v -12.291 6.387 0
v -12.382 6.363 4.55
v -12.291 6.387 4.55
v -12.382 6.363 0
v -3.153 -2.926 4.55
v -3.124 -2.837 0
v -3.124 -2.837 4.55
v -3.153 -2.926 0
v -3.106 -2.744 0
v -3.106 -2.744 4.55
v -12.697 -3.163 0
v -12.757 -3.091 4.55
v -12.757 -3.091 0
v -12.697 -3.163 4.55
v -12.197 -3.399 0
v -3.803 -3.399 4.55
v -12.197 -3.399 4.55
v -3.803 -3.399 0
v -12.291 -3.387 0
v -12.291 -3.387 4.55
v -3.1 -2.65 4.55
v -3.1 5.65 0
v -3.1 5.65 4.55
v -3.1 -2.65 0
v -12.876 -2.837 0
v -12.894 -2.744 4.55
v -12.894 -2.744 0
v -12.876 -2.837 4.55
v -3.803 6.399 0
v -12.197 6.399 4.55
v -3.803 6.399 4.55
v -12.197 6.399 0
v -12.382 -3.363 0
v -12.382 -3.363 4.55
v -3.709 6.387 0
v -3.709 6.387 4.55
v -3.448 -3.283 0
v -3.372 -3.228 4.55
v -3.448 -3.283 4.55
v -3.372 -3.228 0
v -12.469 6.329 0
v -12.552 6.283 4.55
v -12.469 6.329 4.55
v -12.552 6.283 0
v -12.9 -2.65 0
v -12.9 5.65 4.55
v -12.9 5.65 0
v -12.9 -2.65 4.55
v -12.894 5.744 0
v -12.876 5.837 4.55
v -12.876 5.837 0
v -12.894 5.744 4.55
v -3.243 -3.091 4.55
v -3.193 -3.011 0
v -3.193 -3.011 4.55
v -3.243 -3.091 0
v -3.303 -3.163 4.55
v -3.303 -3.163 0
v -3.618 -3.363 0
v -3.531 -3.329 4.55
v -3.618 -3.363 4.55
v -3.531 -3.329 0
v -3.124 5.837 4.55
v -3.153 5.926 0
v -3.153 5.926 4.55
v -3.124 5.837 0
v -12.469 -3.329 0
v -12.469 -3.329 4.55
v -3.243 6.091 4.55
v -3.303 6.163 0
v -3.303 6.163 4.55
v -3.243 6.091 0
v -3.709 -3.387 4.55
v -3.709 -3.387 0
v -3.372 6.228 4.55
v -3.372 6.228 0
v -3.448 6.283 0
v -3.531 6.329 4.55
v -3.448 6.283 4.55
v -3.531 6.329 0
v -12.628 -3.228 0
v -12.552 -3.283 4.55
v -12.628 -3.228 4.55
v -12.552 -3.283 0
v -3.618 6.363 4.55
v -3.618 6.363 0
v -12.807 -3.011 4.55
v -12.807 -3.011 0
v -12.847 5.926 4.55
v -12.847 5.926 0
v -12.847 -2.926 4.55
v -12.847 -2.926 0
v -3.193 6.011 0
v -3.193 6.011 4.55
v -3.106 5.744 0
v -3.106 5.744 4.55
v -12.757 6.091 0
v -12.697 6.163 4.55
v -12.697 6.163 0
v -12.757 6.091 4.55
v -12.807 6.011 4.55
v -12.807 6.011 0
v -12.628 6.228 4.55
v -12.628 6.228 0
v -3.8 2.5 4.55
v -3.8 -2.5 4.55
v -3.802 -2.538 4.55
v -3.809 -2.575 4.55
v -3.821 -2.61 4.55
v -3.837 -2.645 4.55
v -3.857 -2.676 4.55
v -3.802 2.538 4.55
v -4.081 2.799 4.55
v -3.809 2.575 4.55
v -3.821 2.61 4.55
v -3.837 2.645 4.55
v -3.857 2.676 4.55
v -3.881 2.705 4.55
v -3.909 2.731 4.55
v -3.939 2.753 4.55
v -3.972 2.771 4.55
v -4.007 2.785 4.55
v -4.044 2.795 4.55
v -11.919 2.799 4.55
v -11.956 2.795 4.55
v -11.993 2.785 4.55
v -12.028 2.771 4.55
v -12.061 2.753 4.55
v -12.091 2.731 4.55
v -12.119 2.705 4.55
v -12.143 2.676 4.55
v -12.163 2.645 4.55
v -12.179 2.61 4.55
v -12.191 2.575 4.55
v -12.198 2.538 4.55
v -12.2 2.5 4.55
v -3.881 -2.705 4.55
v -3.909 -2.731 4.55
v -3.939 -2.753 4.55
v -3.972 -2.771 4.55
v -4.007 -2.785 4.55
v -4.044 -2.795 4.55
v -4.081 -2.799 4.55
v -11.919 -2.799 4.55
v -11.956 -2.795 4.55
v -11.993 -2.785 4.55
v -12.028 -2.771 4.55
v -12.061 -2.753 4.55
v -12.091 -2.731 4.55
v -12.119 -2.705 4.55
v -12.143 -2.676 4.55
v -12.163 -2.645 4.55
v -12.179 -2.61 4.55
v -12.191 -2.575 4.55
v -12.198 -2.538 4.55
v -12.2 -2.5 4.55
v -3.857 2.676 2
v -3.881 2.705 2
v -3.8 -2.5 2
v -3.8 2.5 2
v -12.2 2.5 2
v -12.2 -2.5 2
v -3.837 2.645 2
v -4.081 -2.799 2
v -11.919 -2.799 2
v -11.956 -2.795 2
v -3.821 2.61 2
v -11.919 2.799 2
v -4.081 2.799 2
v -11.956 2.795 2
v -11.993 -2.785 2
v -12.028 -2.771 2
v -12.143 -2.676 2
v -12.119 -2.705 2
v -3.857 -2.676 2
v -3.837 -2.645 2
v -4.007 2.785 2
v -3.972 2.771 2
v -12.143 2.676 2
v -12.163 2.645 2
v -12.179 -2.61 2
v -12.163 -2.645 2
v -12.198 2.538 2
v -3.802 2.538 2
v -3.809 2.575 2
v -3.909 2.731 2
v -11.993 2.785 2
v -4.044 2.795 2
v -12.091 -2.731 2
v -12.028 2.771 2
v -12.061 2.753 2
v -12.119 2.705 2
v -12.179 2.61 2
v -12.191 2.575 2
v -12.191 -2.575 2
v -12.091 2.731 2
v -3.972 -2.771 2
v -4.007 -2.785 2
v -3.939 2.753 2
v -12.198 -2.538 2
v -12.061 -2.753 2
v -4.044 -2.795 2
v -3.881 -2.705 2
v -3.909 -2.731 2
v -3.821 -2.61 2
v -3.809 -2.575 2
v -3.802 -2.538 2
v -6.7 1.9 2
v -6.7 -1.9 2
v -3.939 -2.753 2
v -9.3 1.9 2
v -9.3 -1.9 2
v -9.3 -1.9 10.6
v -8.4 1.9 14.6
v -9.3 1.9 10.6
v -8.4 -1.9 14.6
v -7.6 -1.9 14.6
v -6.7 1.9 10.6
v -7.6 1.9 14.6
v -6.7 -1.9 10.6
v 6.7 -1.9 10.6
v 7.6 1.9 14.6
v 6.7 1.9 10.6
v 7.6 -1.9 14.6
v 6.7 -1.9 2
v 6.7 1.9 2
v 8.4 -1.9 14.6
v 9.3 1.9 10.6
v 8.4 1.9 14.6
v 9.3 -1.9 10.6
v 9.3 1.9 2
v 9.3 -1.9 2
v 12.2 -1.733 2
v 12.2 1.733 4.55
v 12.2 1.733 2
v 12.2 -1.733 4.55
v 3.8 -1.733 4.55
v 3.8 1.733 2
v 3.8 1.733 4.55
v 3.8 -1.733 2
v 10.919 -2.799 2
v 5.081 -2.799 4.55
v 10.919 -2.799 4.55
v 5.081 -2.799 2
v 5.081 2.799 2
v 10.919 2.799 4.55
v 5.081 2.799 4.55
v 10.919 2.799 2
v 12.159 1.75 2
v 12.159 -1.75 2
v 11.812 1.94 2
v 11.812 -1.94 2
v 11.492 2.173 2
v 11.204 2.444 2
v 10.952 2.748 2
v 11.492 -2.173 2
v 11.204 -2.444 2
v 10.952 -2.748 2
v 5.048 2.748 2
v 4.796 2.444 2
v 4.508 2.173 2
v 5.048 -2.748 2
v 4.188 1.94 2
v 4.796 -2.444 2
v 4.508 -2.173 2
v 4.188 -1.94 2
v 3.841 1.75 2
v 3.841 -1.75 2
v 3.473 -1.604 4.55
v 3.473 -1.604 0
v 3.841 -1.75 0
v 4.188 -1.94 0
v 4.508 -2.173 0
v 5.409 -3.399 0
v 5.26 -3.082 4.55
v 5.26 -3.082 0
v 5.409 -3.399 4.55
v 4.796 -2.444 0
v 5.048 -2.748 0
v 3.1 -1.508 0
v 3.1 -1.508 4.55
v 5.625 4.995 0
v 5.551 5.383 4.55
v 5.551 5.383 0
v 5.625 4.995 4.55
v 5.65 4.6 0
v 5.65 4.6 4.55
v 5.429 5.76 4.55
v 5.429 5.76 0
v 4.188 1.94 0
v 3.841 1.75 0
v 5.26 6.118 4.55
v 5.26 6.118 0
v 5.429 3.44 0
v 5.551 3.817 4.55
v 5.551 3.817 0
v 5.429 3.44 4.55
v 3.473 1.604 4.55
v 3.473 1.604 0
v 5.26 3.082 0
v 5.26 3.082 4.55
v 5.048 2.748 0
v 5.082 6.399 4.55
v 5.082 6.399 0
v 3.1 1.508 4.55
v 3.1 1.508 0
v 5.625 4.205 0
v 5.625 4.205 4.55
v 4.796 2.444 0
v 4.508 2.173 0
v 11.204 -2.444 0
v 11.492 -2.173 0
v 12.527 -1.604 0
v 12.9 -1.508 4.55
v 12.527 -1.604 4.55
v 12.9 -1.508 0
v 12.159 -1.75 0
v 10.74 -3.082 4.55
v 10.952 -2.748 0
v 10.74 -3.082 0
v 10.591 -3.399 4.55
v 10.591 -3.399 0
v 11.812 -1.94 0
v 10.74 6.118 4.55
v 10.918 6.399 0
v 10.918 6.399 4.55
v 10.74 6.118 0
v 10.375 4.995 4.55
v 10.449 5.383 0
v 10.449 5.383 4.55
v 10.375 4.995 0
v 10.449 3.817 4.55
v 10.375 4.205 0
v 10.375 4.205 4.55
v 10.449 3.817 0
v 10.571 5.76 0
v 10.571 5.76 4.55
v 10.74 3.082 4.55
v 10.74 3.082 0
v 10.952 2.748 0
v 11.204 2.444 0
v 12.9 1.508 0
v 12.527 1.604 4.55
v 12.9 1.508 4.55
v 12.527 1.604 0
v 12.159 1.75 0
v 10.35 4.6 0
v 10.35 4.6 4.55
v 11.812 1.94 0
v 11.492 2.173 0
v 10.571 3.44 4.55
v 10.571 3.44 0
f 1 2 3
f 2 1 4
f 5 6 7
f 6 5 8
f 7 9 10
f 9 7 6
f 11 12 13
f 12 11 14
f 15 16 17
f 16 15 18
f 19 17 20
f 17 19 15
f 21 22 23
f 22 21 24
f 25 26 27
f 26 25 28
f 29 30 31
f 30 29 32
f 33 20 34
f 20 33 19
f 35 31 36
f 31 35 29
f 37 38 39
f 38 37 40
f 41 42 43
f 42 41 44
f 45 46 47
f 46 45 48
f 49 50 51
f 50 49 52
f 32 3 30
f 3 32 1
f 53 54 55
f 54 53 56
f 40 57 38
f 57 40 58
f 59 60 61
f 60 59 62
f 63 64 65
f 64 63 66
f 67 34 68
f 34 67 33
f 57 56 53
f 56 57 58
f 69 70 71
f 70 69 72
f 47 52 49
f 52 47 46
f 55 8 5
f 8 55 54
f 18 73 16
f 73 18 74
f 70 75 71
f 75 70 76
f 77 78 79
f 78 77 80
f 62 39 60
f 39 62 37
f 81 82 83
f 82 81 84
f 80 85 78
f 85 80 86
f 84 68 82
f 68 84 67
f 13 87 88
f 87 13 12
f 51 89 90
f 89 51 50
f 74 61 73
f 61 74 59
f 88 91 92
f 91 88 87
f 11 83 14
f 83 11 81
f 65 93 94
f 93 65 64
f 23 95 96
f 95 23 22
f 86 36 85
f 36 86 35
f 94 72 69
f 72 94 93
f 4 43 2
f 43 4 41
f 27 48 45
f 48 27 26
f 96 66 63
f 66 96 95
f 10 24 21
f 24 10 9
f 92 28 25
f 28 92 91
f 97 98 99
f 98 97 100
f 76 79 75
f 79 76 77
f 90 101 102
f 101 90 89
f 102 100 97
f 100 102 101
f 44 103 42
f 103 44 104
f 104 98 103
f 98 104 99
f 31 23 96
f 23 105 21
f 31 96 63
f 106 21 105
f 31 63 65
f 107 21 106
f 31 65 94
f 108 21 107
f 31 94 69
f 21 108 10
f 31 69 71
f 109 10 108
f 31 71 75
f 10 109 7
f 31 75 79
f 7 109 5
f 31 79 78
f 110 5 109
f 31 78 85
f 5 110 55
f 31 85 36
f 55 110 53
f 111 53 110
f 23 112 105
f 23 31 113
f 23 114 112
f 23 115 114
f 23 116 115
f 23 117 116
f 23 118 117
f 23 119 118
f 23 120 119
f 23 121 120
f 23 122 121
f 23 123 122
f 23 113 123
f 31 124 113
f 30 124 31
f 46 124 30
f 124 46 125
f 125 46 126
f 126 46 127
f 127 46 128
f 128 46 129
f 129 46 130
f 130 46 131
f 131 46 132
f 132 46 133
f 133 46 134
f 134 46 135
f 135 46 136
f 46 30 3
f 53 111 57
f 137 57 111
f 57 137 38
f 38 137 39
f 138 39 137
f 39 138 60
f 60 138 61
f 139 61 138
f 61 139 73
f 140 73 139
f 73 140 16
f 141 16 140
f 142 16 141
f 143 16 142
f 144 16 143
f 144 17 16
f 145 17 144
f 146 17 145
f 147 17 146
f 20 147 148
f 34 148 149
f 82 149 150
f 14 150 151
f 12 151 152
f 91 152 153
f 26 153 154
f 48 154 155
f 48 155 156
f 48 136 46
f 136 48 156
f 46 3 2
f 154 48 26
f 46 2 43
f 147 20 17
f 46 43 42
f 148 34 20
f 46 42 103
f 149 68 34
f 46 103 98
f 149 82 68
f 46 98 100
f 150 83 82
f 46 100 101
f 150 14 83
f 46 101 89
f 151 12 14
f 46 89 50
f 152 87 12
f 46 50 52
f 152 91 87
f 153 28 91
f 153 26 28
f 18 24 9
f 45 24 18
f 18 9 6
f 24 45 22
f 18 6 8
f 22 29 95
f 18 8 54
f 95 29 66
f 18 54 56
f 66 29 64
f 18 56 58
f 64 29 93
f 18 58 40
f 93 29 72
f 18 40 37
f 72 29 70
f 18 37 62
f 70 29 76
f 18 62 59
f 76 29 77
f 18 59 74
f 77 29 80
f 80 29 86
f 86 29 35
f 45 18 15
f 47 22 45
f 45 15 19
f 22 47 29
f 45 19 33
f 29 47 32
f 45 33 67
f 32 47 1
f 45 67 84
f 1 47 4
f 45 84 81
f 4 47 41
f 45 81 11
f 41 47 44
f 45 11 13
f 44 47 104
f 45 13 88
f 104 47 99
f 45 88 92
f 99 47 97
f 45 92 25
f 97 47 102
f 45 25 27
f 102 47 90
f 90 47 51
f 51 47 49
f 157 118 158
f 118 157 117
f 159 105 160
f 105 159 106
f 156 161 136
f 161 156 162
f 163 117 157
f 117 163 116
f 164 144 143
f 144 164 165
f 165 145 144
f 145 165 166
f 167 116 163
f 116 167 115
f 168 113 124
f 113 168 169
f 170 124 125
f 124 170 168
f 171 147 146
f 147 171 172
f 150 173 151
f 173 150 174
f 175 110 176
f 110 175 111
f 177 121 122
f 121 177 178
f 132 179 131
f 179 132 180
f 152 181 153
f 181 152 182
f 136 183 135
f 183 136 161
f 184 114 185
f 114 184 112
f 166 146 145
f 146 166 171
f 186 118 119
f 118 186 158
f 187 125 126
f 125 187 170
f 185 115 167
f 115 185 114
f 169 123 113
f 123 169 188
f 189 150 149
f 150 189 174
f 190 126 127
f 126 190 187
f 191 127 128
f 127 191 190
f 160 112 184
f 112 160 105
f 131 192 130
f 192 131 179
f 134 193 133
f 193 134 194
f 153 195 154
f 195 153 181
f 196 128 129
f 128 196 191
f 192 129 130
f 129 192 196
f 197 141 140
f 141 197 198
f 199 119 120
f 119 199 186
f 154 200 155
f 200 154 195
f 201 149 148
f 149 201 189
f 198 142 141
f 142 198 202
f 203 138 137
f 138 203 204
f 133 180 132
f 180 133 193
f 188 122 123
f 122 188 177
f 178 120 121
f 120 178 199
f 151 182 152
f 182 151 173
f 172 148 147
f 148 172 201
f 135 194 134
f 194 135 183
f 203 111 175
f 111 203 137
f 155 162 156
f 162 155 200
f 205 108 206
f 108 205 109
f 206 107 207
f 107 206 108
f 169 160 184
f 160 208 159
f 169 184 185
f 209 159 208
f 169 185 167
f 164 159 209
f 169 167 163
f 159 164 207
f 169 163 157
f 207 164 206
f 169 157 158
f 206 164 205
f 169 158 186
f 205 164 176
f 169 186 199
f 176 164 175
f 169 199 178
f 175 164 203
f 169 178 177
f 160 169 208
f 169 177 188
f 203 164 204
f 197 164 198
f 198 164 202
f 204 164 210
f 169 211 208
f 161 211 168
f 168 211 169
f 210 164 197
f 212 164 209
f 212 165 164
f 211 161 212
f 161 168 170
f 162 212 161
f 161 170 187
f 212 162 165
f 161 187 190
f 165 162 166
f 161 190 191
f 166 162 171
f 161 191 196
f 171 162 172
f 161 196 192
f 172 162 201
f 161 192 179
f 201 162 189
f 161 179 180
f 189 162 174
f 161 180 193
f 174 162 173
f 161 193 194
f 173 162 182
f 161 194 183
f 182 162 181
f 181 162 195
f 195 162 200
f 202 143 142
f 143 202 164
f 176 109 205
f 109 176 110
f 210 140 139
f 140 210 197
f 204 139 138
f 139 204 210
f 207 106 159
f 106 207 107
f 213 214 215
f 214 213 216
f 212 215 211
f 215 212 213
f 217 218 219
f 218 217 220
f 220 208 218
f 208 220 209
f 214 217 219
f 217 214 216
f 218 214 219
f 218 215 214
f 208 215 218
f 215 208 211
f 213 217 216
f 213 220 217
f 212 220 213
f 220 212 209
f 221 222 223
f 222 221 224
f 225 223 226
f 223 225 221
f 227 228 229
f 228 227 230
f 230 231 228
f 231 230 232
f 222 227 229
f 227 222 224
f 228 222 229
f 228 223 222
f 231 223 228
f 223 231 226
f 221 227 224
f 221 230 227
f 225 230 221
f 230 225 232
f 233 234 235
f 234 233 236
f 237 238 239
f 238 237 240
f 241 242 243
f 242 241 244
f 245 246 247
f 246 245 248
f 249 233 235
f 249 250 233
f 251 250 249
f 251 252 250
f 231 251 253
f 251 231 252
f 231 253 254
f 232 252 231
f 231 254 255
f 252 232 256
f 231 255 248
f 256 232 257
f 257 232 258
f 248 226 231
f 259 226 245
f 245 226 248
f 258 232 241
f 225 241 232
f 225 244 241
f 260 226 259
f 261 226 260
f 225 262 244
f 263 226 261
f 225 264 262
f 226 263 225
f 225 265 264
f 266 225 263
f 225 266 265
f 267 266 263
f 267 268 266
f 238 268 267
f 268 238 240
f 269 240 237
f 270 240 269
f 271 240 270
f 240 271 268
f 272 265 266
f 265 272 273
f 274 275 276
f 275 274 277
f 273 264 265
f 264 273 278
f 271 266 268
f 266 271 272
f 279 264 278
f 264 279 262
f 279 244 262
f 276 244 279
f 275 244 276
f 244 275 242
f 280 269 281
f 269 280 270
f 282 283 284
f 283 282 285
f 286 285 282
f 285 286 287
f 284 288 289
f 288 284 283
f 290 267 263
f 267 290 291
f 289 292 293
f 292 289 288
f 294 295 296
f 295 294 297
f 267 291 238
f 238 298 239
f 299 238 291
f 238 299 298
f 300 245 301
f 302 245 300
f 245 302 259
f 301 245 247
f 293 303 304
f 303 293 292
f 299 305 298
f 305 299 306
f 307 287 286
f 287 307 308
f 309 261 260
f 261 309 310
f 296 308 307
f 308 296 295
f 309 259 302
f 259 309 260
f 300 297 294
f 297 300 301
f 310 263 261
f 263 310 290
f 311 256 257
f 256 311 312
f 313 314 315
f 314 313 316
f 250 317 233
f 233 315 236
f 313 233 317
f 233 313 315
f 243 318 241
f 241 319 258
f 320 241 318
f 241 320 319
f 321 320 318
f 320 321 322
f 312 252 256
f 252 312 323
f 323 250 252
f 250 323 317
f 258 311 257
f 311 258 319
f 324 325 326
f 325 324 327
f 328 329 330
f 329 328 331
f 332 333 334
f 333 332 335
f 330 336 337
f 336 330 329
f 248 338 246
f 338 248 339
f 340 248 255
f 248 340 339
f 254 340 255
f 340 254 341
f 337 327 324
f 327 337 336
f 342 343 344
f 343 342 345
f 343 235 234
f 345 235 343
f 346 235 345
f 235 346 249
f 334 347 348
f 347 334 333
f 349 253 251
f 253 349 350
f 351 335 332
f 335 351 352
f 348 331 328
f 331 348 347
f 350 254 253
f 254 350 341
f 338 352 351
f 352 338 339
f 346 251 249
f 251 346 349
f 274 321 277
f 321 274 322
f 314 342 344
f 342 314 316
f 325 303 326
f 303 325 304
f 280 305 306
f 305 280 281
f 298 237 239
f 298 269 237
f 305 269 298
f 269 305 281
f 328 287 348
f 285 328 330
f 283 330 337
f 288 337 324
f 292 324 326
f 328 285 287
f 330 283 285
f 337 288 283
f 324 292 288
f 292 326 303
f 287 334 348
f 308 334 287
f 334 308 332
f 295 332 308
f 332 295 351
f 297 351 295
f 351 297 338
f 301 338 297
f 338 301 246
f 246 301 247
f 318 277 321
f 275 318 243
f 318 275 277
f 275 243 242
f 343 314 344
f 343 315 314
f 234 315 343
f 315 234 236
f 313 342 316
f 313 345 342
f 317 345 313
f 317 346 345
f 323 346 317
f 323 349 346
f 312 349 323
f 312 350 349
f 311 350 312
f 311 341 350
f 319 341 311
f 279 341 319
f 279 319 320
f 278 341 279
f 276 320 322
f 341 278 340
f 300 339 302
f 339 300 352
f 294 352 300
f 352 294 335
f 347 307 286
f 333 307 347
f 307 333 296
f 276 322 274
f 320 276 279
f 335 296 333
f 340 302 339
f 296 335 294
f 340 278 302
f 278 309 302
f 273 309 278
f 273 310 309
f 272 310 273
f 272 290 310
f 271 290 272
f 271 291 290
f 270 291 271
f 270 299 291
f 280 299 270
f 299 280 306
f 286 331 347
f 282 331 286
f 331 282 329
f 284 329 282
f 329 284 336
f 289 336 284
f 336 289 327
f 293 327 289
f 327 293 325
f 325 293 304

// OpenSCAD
translate([-8,0,0]) { 
// Archived geometry from ../../../parts/oobb_organization_storage_drawer_unit_rectangle_100_ml_tamper_evident_systempak_209_container_2_column_2_row_ai_version_7_style_unit_2_wide_2_tall/front_plug_square.scad
$fn = 50;

difference() {
	union() {
		translate(v = [0, 0, 0]) {
			rotate(a = [0, 0, 0]) {
				difference() {
					union() {
						translate(v = [0, 0, 0]) {
							rotate(a = [0, 0, 0]) {
								difference() {
									union() {
										translate(v = [0, 0, 0]) {
											rotate(a = [0, 0, 0]) {
												difference() {
													union() {
														translate(v = [0, 1.5, 0]) {
															hull() {
																translate(v = [-4.15, 4.15, 0]) {
																	cylinder(h = 4.55, r = 0.75);
																}
																translate(v = [4.15, 4.15, 0]) {
																	cylinder(h = 4.55, r = 0.75);
																}
																translate(v = [-4.15, -4.15, 0]) {
																	cylinder(h = 4.55, r = 0.75);
																}
																translate(v = [4.15, -4.15, 0]) {
																	cylinder(h = 4.55, r = 0.75);
																}
															}
														}
													}
													union() {
														translate(v = [0, 0, 2.0]) {
															hull() {
																translate(v = [-3.9000000000000004, 2.5, 0]) {
																	cylinder(h = 2.65, r = 0.3);
																}
																translate(v = [3.9000000000000004, 2.5, 0]) {
																	cylinder(h = 2.65, r = 0.3);
																}
																translate(v = [-3.9000000000000004, -2.5, 0]) {
																	cylinder(h = 2.65, r = 0.3);
																}
																translate(v = [3.9000000000000004, -2.5, 0]) {
																	cylinder(h = 2.65, r = 0.3);
																}
															}
														}
													}
												}
											}
										}
										translate(v = [0, 0, 0]) {
											rotate(a = [0, 0, 0]) {
												difference() {
													union() {
														translate(v = [-1.4000000000000001, -1.9, 1.95]) {
															cube(size = [2.8000000000000003, 3.8, 12.65]);
														}
													}
													union() {
														translate(v = [0, 2.0, 0]) {
															rotate(a = [90, 0, 0]) {
																linear_extrude(height = 4.0) {
																	polygon(points = [[-1.3, 1.85], [-1.3, 10.6], [-0.4, 14.6], [-0.4, 14.799999999999999], [-1.6, 14.799999999999999], [-1.6, 1.85]]);
																}
															}
														}
														translate(v = [0, 2.0, 0]) {
															rotate(a = [90, 0, 0]) {
																linear_extrude(height = 4.0) {
																	polygon(points = [[1.3, 1.85], [1.3, 10.6], [0.4, 14.6], [0.4, 14.799999999999999], [1.6, 14.799999999999999], [1.6, 1.85]]);
																}
															}
														}
													}
												}
											}
										}
									}
									union();
								}
							}
						}
					}
					union();
				}
			}
		}
	}
	union();
}
 }
translate([8,0,0]) { 
// Archived geometry from ../../../parts/oobb_organization_storage_drawer_unit_rectangle_100_ml_tamper_evident_systempak_209_container_2_column_2_row_ai_version_7_style_unit_2_wide_2_tall/front_plug.scad
$fn = 50;

difference() {
	union() {
		translate(v = [0, 0, 0]) {
			rotate(a = [0, 0, 0]) {
				difference() {
					union() {
						translate(v = [0, 0, 0]) {
							rotate(a = [0, 0, 0]) {
								difference() {
									union() {
										translate(v = [0, 0, 0]) {
											rotate(a = [0, 0, 0]) {
												difference() {
													union() {
														translate(v = [0, 1.5, 0]) {
															hull() {
																translate(v = [-4.15, 4.15, 0]) {
																	cylinder(h = 4.55, r = 0.75);
																}
																translate(v = [4.15, 4.15, 0]) {
																	cylinder(h = 4.55, r = 0.75);
																}
																translate(v = [-4.15, -4.15, 0]) {
																	cylinder(h = 4.55, r = 0.75);
																}
																translate(v = [4.15, -4.15, 0]) {
																	cylinder(h = 4.55, r = 0.75);
																}
															}
														}
													}
													union() {
														translate(v = [0, 0, 2.0]) {
															hull() {
																translate(v = [-3.9000000000000004, 2.5, 0]) {
																	cylinder(h = 2.65, r = 0.3);
																}
																translate(v = [3.9000000000000004, 2.5, 0]) {
																	cylinder(h = 2.65, r = 0.3);
																}
																translate(v = [-3.9000000000000004, -2.5, 0]) {
																	cylinder(h = 2.65, r = 0.3);
																}
																translate(v = [3.9000000000000004, -2.5, 0]) {
																	cylinder(h = 2.65, r = 0.3);
																}
															}
														}
														translate(v = [-5.5, -4.6, -0.1]) {
															cylinder(h = 4.75, r = 3.15);
														}
														translate(v = [-5.5, 4.6, -0.1]) {
															cylinder(h = 4.75, r = 3.15);
														}
														translate(v = [5.5, -4.6, -0.1]) {
															cylinder(h = 4.75, r = 3.15);
														}
														translate(v = [5.5, 4.6, -0.1]) {
															cylinder(h = 4.75, r = 3.15);
														}
													}
												}
											}
										}
										translate(v = [0, 0, 0]) {
											rotate(a = [0, 0, 0]) {
												difference() {
													union() {
														translate(v = [-1.4000000000000001, -1.9, 1.95]) {
															cube(size = [2.8000000000000003, 3.8, 12.65]);
														}
													}
													union() {
														translate(v = [0, 2.0, 0]) {
															rotate(a = [90, 0, 0]) {
																linear_extrude(height = 4.0) {
																	polygon(points = [[-1.3, 1.85], [-1.3, 10.6], [-0.4, 14.6], [-0.4, 14.799999999999999], [-1.6, 14.799999999999999], [-1.6, 1.85]]);
																}
															}
														}
														translate(v = [0, 2.0, 0]) {
															rotate(a = [90, 0, 0]) {
																linear_extrude(height = 4.0) {
																	polygon(points = [[1.3, 1.85], [1.3, 10.6], [0.4, 14.6], [0.4, 14.799999999999999], [1.6, 14.799999999999999], [1.6, 1.85]]);
																}
															}
														}
													}
												}
											}
										}
									}
									union();
								}
							}
						}
					}
					union();
				}
			}
		}
	}
	union();
}
 }
